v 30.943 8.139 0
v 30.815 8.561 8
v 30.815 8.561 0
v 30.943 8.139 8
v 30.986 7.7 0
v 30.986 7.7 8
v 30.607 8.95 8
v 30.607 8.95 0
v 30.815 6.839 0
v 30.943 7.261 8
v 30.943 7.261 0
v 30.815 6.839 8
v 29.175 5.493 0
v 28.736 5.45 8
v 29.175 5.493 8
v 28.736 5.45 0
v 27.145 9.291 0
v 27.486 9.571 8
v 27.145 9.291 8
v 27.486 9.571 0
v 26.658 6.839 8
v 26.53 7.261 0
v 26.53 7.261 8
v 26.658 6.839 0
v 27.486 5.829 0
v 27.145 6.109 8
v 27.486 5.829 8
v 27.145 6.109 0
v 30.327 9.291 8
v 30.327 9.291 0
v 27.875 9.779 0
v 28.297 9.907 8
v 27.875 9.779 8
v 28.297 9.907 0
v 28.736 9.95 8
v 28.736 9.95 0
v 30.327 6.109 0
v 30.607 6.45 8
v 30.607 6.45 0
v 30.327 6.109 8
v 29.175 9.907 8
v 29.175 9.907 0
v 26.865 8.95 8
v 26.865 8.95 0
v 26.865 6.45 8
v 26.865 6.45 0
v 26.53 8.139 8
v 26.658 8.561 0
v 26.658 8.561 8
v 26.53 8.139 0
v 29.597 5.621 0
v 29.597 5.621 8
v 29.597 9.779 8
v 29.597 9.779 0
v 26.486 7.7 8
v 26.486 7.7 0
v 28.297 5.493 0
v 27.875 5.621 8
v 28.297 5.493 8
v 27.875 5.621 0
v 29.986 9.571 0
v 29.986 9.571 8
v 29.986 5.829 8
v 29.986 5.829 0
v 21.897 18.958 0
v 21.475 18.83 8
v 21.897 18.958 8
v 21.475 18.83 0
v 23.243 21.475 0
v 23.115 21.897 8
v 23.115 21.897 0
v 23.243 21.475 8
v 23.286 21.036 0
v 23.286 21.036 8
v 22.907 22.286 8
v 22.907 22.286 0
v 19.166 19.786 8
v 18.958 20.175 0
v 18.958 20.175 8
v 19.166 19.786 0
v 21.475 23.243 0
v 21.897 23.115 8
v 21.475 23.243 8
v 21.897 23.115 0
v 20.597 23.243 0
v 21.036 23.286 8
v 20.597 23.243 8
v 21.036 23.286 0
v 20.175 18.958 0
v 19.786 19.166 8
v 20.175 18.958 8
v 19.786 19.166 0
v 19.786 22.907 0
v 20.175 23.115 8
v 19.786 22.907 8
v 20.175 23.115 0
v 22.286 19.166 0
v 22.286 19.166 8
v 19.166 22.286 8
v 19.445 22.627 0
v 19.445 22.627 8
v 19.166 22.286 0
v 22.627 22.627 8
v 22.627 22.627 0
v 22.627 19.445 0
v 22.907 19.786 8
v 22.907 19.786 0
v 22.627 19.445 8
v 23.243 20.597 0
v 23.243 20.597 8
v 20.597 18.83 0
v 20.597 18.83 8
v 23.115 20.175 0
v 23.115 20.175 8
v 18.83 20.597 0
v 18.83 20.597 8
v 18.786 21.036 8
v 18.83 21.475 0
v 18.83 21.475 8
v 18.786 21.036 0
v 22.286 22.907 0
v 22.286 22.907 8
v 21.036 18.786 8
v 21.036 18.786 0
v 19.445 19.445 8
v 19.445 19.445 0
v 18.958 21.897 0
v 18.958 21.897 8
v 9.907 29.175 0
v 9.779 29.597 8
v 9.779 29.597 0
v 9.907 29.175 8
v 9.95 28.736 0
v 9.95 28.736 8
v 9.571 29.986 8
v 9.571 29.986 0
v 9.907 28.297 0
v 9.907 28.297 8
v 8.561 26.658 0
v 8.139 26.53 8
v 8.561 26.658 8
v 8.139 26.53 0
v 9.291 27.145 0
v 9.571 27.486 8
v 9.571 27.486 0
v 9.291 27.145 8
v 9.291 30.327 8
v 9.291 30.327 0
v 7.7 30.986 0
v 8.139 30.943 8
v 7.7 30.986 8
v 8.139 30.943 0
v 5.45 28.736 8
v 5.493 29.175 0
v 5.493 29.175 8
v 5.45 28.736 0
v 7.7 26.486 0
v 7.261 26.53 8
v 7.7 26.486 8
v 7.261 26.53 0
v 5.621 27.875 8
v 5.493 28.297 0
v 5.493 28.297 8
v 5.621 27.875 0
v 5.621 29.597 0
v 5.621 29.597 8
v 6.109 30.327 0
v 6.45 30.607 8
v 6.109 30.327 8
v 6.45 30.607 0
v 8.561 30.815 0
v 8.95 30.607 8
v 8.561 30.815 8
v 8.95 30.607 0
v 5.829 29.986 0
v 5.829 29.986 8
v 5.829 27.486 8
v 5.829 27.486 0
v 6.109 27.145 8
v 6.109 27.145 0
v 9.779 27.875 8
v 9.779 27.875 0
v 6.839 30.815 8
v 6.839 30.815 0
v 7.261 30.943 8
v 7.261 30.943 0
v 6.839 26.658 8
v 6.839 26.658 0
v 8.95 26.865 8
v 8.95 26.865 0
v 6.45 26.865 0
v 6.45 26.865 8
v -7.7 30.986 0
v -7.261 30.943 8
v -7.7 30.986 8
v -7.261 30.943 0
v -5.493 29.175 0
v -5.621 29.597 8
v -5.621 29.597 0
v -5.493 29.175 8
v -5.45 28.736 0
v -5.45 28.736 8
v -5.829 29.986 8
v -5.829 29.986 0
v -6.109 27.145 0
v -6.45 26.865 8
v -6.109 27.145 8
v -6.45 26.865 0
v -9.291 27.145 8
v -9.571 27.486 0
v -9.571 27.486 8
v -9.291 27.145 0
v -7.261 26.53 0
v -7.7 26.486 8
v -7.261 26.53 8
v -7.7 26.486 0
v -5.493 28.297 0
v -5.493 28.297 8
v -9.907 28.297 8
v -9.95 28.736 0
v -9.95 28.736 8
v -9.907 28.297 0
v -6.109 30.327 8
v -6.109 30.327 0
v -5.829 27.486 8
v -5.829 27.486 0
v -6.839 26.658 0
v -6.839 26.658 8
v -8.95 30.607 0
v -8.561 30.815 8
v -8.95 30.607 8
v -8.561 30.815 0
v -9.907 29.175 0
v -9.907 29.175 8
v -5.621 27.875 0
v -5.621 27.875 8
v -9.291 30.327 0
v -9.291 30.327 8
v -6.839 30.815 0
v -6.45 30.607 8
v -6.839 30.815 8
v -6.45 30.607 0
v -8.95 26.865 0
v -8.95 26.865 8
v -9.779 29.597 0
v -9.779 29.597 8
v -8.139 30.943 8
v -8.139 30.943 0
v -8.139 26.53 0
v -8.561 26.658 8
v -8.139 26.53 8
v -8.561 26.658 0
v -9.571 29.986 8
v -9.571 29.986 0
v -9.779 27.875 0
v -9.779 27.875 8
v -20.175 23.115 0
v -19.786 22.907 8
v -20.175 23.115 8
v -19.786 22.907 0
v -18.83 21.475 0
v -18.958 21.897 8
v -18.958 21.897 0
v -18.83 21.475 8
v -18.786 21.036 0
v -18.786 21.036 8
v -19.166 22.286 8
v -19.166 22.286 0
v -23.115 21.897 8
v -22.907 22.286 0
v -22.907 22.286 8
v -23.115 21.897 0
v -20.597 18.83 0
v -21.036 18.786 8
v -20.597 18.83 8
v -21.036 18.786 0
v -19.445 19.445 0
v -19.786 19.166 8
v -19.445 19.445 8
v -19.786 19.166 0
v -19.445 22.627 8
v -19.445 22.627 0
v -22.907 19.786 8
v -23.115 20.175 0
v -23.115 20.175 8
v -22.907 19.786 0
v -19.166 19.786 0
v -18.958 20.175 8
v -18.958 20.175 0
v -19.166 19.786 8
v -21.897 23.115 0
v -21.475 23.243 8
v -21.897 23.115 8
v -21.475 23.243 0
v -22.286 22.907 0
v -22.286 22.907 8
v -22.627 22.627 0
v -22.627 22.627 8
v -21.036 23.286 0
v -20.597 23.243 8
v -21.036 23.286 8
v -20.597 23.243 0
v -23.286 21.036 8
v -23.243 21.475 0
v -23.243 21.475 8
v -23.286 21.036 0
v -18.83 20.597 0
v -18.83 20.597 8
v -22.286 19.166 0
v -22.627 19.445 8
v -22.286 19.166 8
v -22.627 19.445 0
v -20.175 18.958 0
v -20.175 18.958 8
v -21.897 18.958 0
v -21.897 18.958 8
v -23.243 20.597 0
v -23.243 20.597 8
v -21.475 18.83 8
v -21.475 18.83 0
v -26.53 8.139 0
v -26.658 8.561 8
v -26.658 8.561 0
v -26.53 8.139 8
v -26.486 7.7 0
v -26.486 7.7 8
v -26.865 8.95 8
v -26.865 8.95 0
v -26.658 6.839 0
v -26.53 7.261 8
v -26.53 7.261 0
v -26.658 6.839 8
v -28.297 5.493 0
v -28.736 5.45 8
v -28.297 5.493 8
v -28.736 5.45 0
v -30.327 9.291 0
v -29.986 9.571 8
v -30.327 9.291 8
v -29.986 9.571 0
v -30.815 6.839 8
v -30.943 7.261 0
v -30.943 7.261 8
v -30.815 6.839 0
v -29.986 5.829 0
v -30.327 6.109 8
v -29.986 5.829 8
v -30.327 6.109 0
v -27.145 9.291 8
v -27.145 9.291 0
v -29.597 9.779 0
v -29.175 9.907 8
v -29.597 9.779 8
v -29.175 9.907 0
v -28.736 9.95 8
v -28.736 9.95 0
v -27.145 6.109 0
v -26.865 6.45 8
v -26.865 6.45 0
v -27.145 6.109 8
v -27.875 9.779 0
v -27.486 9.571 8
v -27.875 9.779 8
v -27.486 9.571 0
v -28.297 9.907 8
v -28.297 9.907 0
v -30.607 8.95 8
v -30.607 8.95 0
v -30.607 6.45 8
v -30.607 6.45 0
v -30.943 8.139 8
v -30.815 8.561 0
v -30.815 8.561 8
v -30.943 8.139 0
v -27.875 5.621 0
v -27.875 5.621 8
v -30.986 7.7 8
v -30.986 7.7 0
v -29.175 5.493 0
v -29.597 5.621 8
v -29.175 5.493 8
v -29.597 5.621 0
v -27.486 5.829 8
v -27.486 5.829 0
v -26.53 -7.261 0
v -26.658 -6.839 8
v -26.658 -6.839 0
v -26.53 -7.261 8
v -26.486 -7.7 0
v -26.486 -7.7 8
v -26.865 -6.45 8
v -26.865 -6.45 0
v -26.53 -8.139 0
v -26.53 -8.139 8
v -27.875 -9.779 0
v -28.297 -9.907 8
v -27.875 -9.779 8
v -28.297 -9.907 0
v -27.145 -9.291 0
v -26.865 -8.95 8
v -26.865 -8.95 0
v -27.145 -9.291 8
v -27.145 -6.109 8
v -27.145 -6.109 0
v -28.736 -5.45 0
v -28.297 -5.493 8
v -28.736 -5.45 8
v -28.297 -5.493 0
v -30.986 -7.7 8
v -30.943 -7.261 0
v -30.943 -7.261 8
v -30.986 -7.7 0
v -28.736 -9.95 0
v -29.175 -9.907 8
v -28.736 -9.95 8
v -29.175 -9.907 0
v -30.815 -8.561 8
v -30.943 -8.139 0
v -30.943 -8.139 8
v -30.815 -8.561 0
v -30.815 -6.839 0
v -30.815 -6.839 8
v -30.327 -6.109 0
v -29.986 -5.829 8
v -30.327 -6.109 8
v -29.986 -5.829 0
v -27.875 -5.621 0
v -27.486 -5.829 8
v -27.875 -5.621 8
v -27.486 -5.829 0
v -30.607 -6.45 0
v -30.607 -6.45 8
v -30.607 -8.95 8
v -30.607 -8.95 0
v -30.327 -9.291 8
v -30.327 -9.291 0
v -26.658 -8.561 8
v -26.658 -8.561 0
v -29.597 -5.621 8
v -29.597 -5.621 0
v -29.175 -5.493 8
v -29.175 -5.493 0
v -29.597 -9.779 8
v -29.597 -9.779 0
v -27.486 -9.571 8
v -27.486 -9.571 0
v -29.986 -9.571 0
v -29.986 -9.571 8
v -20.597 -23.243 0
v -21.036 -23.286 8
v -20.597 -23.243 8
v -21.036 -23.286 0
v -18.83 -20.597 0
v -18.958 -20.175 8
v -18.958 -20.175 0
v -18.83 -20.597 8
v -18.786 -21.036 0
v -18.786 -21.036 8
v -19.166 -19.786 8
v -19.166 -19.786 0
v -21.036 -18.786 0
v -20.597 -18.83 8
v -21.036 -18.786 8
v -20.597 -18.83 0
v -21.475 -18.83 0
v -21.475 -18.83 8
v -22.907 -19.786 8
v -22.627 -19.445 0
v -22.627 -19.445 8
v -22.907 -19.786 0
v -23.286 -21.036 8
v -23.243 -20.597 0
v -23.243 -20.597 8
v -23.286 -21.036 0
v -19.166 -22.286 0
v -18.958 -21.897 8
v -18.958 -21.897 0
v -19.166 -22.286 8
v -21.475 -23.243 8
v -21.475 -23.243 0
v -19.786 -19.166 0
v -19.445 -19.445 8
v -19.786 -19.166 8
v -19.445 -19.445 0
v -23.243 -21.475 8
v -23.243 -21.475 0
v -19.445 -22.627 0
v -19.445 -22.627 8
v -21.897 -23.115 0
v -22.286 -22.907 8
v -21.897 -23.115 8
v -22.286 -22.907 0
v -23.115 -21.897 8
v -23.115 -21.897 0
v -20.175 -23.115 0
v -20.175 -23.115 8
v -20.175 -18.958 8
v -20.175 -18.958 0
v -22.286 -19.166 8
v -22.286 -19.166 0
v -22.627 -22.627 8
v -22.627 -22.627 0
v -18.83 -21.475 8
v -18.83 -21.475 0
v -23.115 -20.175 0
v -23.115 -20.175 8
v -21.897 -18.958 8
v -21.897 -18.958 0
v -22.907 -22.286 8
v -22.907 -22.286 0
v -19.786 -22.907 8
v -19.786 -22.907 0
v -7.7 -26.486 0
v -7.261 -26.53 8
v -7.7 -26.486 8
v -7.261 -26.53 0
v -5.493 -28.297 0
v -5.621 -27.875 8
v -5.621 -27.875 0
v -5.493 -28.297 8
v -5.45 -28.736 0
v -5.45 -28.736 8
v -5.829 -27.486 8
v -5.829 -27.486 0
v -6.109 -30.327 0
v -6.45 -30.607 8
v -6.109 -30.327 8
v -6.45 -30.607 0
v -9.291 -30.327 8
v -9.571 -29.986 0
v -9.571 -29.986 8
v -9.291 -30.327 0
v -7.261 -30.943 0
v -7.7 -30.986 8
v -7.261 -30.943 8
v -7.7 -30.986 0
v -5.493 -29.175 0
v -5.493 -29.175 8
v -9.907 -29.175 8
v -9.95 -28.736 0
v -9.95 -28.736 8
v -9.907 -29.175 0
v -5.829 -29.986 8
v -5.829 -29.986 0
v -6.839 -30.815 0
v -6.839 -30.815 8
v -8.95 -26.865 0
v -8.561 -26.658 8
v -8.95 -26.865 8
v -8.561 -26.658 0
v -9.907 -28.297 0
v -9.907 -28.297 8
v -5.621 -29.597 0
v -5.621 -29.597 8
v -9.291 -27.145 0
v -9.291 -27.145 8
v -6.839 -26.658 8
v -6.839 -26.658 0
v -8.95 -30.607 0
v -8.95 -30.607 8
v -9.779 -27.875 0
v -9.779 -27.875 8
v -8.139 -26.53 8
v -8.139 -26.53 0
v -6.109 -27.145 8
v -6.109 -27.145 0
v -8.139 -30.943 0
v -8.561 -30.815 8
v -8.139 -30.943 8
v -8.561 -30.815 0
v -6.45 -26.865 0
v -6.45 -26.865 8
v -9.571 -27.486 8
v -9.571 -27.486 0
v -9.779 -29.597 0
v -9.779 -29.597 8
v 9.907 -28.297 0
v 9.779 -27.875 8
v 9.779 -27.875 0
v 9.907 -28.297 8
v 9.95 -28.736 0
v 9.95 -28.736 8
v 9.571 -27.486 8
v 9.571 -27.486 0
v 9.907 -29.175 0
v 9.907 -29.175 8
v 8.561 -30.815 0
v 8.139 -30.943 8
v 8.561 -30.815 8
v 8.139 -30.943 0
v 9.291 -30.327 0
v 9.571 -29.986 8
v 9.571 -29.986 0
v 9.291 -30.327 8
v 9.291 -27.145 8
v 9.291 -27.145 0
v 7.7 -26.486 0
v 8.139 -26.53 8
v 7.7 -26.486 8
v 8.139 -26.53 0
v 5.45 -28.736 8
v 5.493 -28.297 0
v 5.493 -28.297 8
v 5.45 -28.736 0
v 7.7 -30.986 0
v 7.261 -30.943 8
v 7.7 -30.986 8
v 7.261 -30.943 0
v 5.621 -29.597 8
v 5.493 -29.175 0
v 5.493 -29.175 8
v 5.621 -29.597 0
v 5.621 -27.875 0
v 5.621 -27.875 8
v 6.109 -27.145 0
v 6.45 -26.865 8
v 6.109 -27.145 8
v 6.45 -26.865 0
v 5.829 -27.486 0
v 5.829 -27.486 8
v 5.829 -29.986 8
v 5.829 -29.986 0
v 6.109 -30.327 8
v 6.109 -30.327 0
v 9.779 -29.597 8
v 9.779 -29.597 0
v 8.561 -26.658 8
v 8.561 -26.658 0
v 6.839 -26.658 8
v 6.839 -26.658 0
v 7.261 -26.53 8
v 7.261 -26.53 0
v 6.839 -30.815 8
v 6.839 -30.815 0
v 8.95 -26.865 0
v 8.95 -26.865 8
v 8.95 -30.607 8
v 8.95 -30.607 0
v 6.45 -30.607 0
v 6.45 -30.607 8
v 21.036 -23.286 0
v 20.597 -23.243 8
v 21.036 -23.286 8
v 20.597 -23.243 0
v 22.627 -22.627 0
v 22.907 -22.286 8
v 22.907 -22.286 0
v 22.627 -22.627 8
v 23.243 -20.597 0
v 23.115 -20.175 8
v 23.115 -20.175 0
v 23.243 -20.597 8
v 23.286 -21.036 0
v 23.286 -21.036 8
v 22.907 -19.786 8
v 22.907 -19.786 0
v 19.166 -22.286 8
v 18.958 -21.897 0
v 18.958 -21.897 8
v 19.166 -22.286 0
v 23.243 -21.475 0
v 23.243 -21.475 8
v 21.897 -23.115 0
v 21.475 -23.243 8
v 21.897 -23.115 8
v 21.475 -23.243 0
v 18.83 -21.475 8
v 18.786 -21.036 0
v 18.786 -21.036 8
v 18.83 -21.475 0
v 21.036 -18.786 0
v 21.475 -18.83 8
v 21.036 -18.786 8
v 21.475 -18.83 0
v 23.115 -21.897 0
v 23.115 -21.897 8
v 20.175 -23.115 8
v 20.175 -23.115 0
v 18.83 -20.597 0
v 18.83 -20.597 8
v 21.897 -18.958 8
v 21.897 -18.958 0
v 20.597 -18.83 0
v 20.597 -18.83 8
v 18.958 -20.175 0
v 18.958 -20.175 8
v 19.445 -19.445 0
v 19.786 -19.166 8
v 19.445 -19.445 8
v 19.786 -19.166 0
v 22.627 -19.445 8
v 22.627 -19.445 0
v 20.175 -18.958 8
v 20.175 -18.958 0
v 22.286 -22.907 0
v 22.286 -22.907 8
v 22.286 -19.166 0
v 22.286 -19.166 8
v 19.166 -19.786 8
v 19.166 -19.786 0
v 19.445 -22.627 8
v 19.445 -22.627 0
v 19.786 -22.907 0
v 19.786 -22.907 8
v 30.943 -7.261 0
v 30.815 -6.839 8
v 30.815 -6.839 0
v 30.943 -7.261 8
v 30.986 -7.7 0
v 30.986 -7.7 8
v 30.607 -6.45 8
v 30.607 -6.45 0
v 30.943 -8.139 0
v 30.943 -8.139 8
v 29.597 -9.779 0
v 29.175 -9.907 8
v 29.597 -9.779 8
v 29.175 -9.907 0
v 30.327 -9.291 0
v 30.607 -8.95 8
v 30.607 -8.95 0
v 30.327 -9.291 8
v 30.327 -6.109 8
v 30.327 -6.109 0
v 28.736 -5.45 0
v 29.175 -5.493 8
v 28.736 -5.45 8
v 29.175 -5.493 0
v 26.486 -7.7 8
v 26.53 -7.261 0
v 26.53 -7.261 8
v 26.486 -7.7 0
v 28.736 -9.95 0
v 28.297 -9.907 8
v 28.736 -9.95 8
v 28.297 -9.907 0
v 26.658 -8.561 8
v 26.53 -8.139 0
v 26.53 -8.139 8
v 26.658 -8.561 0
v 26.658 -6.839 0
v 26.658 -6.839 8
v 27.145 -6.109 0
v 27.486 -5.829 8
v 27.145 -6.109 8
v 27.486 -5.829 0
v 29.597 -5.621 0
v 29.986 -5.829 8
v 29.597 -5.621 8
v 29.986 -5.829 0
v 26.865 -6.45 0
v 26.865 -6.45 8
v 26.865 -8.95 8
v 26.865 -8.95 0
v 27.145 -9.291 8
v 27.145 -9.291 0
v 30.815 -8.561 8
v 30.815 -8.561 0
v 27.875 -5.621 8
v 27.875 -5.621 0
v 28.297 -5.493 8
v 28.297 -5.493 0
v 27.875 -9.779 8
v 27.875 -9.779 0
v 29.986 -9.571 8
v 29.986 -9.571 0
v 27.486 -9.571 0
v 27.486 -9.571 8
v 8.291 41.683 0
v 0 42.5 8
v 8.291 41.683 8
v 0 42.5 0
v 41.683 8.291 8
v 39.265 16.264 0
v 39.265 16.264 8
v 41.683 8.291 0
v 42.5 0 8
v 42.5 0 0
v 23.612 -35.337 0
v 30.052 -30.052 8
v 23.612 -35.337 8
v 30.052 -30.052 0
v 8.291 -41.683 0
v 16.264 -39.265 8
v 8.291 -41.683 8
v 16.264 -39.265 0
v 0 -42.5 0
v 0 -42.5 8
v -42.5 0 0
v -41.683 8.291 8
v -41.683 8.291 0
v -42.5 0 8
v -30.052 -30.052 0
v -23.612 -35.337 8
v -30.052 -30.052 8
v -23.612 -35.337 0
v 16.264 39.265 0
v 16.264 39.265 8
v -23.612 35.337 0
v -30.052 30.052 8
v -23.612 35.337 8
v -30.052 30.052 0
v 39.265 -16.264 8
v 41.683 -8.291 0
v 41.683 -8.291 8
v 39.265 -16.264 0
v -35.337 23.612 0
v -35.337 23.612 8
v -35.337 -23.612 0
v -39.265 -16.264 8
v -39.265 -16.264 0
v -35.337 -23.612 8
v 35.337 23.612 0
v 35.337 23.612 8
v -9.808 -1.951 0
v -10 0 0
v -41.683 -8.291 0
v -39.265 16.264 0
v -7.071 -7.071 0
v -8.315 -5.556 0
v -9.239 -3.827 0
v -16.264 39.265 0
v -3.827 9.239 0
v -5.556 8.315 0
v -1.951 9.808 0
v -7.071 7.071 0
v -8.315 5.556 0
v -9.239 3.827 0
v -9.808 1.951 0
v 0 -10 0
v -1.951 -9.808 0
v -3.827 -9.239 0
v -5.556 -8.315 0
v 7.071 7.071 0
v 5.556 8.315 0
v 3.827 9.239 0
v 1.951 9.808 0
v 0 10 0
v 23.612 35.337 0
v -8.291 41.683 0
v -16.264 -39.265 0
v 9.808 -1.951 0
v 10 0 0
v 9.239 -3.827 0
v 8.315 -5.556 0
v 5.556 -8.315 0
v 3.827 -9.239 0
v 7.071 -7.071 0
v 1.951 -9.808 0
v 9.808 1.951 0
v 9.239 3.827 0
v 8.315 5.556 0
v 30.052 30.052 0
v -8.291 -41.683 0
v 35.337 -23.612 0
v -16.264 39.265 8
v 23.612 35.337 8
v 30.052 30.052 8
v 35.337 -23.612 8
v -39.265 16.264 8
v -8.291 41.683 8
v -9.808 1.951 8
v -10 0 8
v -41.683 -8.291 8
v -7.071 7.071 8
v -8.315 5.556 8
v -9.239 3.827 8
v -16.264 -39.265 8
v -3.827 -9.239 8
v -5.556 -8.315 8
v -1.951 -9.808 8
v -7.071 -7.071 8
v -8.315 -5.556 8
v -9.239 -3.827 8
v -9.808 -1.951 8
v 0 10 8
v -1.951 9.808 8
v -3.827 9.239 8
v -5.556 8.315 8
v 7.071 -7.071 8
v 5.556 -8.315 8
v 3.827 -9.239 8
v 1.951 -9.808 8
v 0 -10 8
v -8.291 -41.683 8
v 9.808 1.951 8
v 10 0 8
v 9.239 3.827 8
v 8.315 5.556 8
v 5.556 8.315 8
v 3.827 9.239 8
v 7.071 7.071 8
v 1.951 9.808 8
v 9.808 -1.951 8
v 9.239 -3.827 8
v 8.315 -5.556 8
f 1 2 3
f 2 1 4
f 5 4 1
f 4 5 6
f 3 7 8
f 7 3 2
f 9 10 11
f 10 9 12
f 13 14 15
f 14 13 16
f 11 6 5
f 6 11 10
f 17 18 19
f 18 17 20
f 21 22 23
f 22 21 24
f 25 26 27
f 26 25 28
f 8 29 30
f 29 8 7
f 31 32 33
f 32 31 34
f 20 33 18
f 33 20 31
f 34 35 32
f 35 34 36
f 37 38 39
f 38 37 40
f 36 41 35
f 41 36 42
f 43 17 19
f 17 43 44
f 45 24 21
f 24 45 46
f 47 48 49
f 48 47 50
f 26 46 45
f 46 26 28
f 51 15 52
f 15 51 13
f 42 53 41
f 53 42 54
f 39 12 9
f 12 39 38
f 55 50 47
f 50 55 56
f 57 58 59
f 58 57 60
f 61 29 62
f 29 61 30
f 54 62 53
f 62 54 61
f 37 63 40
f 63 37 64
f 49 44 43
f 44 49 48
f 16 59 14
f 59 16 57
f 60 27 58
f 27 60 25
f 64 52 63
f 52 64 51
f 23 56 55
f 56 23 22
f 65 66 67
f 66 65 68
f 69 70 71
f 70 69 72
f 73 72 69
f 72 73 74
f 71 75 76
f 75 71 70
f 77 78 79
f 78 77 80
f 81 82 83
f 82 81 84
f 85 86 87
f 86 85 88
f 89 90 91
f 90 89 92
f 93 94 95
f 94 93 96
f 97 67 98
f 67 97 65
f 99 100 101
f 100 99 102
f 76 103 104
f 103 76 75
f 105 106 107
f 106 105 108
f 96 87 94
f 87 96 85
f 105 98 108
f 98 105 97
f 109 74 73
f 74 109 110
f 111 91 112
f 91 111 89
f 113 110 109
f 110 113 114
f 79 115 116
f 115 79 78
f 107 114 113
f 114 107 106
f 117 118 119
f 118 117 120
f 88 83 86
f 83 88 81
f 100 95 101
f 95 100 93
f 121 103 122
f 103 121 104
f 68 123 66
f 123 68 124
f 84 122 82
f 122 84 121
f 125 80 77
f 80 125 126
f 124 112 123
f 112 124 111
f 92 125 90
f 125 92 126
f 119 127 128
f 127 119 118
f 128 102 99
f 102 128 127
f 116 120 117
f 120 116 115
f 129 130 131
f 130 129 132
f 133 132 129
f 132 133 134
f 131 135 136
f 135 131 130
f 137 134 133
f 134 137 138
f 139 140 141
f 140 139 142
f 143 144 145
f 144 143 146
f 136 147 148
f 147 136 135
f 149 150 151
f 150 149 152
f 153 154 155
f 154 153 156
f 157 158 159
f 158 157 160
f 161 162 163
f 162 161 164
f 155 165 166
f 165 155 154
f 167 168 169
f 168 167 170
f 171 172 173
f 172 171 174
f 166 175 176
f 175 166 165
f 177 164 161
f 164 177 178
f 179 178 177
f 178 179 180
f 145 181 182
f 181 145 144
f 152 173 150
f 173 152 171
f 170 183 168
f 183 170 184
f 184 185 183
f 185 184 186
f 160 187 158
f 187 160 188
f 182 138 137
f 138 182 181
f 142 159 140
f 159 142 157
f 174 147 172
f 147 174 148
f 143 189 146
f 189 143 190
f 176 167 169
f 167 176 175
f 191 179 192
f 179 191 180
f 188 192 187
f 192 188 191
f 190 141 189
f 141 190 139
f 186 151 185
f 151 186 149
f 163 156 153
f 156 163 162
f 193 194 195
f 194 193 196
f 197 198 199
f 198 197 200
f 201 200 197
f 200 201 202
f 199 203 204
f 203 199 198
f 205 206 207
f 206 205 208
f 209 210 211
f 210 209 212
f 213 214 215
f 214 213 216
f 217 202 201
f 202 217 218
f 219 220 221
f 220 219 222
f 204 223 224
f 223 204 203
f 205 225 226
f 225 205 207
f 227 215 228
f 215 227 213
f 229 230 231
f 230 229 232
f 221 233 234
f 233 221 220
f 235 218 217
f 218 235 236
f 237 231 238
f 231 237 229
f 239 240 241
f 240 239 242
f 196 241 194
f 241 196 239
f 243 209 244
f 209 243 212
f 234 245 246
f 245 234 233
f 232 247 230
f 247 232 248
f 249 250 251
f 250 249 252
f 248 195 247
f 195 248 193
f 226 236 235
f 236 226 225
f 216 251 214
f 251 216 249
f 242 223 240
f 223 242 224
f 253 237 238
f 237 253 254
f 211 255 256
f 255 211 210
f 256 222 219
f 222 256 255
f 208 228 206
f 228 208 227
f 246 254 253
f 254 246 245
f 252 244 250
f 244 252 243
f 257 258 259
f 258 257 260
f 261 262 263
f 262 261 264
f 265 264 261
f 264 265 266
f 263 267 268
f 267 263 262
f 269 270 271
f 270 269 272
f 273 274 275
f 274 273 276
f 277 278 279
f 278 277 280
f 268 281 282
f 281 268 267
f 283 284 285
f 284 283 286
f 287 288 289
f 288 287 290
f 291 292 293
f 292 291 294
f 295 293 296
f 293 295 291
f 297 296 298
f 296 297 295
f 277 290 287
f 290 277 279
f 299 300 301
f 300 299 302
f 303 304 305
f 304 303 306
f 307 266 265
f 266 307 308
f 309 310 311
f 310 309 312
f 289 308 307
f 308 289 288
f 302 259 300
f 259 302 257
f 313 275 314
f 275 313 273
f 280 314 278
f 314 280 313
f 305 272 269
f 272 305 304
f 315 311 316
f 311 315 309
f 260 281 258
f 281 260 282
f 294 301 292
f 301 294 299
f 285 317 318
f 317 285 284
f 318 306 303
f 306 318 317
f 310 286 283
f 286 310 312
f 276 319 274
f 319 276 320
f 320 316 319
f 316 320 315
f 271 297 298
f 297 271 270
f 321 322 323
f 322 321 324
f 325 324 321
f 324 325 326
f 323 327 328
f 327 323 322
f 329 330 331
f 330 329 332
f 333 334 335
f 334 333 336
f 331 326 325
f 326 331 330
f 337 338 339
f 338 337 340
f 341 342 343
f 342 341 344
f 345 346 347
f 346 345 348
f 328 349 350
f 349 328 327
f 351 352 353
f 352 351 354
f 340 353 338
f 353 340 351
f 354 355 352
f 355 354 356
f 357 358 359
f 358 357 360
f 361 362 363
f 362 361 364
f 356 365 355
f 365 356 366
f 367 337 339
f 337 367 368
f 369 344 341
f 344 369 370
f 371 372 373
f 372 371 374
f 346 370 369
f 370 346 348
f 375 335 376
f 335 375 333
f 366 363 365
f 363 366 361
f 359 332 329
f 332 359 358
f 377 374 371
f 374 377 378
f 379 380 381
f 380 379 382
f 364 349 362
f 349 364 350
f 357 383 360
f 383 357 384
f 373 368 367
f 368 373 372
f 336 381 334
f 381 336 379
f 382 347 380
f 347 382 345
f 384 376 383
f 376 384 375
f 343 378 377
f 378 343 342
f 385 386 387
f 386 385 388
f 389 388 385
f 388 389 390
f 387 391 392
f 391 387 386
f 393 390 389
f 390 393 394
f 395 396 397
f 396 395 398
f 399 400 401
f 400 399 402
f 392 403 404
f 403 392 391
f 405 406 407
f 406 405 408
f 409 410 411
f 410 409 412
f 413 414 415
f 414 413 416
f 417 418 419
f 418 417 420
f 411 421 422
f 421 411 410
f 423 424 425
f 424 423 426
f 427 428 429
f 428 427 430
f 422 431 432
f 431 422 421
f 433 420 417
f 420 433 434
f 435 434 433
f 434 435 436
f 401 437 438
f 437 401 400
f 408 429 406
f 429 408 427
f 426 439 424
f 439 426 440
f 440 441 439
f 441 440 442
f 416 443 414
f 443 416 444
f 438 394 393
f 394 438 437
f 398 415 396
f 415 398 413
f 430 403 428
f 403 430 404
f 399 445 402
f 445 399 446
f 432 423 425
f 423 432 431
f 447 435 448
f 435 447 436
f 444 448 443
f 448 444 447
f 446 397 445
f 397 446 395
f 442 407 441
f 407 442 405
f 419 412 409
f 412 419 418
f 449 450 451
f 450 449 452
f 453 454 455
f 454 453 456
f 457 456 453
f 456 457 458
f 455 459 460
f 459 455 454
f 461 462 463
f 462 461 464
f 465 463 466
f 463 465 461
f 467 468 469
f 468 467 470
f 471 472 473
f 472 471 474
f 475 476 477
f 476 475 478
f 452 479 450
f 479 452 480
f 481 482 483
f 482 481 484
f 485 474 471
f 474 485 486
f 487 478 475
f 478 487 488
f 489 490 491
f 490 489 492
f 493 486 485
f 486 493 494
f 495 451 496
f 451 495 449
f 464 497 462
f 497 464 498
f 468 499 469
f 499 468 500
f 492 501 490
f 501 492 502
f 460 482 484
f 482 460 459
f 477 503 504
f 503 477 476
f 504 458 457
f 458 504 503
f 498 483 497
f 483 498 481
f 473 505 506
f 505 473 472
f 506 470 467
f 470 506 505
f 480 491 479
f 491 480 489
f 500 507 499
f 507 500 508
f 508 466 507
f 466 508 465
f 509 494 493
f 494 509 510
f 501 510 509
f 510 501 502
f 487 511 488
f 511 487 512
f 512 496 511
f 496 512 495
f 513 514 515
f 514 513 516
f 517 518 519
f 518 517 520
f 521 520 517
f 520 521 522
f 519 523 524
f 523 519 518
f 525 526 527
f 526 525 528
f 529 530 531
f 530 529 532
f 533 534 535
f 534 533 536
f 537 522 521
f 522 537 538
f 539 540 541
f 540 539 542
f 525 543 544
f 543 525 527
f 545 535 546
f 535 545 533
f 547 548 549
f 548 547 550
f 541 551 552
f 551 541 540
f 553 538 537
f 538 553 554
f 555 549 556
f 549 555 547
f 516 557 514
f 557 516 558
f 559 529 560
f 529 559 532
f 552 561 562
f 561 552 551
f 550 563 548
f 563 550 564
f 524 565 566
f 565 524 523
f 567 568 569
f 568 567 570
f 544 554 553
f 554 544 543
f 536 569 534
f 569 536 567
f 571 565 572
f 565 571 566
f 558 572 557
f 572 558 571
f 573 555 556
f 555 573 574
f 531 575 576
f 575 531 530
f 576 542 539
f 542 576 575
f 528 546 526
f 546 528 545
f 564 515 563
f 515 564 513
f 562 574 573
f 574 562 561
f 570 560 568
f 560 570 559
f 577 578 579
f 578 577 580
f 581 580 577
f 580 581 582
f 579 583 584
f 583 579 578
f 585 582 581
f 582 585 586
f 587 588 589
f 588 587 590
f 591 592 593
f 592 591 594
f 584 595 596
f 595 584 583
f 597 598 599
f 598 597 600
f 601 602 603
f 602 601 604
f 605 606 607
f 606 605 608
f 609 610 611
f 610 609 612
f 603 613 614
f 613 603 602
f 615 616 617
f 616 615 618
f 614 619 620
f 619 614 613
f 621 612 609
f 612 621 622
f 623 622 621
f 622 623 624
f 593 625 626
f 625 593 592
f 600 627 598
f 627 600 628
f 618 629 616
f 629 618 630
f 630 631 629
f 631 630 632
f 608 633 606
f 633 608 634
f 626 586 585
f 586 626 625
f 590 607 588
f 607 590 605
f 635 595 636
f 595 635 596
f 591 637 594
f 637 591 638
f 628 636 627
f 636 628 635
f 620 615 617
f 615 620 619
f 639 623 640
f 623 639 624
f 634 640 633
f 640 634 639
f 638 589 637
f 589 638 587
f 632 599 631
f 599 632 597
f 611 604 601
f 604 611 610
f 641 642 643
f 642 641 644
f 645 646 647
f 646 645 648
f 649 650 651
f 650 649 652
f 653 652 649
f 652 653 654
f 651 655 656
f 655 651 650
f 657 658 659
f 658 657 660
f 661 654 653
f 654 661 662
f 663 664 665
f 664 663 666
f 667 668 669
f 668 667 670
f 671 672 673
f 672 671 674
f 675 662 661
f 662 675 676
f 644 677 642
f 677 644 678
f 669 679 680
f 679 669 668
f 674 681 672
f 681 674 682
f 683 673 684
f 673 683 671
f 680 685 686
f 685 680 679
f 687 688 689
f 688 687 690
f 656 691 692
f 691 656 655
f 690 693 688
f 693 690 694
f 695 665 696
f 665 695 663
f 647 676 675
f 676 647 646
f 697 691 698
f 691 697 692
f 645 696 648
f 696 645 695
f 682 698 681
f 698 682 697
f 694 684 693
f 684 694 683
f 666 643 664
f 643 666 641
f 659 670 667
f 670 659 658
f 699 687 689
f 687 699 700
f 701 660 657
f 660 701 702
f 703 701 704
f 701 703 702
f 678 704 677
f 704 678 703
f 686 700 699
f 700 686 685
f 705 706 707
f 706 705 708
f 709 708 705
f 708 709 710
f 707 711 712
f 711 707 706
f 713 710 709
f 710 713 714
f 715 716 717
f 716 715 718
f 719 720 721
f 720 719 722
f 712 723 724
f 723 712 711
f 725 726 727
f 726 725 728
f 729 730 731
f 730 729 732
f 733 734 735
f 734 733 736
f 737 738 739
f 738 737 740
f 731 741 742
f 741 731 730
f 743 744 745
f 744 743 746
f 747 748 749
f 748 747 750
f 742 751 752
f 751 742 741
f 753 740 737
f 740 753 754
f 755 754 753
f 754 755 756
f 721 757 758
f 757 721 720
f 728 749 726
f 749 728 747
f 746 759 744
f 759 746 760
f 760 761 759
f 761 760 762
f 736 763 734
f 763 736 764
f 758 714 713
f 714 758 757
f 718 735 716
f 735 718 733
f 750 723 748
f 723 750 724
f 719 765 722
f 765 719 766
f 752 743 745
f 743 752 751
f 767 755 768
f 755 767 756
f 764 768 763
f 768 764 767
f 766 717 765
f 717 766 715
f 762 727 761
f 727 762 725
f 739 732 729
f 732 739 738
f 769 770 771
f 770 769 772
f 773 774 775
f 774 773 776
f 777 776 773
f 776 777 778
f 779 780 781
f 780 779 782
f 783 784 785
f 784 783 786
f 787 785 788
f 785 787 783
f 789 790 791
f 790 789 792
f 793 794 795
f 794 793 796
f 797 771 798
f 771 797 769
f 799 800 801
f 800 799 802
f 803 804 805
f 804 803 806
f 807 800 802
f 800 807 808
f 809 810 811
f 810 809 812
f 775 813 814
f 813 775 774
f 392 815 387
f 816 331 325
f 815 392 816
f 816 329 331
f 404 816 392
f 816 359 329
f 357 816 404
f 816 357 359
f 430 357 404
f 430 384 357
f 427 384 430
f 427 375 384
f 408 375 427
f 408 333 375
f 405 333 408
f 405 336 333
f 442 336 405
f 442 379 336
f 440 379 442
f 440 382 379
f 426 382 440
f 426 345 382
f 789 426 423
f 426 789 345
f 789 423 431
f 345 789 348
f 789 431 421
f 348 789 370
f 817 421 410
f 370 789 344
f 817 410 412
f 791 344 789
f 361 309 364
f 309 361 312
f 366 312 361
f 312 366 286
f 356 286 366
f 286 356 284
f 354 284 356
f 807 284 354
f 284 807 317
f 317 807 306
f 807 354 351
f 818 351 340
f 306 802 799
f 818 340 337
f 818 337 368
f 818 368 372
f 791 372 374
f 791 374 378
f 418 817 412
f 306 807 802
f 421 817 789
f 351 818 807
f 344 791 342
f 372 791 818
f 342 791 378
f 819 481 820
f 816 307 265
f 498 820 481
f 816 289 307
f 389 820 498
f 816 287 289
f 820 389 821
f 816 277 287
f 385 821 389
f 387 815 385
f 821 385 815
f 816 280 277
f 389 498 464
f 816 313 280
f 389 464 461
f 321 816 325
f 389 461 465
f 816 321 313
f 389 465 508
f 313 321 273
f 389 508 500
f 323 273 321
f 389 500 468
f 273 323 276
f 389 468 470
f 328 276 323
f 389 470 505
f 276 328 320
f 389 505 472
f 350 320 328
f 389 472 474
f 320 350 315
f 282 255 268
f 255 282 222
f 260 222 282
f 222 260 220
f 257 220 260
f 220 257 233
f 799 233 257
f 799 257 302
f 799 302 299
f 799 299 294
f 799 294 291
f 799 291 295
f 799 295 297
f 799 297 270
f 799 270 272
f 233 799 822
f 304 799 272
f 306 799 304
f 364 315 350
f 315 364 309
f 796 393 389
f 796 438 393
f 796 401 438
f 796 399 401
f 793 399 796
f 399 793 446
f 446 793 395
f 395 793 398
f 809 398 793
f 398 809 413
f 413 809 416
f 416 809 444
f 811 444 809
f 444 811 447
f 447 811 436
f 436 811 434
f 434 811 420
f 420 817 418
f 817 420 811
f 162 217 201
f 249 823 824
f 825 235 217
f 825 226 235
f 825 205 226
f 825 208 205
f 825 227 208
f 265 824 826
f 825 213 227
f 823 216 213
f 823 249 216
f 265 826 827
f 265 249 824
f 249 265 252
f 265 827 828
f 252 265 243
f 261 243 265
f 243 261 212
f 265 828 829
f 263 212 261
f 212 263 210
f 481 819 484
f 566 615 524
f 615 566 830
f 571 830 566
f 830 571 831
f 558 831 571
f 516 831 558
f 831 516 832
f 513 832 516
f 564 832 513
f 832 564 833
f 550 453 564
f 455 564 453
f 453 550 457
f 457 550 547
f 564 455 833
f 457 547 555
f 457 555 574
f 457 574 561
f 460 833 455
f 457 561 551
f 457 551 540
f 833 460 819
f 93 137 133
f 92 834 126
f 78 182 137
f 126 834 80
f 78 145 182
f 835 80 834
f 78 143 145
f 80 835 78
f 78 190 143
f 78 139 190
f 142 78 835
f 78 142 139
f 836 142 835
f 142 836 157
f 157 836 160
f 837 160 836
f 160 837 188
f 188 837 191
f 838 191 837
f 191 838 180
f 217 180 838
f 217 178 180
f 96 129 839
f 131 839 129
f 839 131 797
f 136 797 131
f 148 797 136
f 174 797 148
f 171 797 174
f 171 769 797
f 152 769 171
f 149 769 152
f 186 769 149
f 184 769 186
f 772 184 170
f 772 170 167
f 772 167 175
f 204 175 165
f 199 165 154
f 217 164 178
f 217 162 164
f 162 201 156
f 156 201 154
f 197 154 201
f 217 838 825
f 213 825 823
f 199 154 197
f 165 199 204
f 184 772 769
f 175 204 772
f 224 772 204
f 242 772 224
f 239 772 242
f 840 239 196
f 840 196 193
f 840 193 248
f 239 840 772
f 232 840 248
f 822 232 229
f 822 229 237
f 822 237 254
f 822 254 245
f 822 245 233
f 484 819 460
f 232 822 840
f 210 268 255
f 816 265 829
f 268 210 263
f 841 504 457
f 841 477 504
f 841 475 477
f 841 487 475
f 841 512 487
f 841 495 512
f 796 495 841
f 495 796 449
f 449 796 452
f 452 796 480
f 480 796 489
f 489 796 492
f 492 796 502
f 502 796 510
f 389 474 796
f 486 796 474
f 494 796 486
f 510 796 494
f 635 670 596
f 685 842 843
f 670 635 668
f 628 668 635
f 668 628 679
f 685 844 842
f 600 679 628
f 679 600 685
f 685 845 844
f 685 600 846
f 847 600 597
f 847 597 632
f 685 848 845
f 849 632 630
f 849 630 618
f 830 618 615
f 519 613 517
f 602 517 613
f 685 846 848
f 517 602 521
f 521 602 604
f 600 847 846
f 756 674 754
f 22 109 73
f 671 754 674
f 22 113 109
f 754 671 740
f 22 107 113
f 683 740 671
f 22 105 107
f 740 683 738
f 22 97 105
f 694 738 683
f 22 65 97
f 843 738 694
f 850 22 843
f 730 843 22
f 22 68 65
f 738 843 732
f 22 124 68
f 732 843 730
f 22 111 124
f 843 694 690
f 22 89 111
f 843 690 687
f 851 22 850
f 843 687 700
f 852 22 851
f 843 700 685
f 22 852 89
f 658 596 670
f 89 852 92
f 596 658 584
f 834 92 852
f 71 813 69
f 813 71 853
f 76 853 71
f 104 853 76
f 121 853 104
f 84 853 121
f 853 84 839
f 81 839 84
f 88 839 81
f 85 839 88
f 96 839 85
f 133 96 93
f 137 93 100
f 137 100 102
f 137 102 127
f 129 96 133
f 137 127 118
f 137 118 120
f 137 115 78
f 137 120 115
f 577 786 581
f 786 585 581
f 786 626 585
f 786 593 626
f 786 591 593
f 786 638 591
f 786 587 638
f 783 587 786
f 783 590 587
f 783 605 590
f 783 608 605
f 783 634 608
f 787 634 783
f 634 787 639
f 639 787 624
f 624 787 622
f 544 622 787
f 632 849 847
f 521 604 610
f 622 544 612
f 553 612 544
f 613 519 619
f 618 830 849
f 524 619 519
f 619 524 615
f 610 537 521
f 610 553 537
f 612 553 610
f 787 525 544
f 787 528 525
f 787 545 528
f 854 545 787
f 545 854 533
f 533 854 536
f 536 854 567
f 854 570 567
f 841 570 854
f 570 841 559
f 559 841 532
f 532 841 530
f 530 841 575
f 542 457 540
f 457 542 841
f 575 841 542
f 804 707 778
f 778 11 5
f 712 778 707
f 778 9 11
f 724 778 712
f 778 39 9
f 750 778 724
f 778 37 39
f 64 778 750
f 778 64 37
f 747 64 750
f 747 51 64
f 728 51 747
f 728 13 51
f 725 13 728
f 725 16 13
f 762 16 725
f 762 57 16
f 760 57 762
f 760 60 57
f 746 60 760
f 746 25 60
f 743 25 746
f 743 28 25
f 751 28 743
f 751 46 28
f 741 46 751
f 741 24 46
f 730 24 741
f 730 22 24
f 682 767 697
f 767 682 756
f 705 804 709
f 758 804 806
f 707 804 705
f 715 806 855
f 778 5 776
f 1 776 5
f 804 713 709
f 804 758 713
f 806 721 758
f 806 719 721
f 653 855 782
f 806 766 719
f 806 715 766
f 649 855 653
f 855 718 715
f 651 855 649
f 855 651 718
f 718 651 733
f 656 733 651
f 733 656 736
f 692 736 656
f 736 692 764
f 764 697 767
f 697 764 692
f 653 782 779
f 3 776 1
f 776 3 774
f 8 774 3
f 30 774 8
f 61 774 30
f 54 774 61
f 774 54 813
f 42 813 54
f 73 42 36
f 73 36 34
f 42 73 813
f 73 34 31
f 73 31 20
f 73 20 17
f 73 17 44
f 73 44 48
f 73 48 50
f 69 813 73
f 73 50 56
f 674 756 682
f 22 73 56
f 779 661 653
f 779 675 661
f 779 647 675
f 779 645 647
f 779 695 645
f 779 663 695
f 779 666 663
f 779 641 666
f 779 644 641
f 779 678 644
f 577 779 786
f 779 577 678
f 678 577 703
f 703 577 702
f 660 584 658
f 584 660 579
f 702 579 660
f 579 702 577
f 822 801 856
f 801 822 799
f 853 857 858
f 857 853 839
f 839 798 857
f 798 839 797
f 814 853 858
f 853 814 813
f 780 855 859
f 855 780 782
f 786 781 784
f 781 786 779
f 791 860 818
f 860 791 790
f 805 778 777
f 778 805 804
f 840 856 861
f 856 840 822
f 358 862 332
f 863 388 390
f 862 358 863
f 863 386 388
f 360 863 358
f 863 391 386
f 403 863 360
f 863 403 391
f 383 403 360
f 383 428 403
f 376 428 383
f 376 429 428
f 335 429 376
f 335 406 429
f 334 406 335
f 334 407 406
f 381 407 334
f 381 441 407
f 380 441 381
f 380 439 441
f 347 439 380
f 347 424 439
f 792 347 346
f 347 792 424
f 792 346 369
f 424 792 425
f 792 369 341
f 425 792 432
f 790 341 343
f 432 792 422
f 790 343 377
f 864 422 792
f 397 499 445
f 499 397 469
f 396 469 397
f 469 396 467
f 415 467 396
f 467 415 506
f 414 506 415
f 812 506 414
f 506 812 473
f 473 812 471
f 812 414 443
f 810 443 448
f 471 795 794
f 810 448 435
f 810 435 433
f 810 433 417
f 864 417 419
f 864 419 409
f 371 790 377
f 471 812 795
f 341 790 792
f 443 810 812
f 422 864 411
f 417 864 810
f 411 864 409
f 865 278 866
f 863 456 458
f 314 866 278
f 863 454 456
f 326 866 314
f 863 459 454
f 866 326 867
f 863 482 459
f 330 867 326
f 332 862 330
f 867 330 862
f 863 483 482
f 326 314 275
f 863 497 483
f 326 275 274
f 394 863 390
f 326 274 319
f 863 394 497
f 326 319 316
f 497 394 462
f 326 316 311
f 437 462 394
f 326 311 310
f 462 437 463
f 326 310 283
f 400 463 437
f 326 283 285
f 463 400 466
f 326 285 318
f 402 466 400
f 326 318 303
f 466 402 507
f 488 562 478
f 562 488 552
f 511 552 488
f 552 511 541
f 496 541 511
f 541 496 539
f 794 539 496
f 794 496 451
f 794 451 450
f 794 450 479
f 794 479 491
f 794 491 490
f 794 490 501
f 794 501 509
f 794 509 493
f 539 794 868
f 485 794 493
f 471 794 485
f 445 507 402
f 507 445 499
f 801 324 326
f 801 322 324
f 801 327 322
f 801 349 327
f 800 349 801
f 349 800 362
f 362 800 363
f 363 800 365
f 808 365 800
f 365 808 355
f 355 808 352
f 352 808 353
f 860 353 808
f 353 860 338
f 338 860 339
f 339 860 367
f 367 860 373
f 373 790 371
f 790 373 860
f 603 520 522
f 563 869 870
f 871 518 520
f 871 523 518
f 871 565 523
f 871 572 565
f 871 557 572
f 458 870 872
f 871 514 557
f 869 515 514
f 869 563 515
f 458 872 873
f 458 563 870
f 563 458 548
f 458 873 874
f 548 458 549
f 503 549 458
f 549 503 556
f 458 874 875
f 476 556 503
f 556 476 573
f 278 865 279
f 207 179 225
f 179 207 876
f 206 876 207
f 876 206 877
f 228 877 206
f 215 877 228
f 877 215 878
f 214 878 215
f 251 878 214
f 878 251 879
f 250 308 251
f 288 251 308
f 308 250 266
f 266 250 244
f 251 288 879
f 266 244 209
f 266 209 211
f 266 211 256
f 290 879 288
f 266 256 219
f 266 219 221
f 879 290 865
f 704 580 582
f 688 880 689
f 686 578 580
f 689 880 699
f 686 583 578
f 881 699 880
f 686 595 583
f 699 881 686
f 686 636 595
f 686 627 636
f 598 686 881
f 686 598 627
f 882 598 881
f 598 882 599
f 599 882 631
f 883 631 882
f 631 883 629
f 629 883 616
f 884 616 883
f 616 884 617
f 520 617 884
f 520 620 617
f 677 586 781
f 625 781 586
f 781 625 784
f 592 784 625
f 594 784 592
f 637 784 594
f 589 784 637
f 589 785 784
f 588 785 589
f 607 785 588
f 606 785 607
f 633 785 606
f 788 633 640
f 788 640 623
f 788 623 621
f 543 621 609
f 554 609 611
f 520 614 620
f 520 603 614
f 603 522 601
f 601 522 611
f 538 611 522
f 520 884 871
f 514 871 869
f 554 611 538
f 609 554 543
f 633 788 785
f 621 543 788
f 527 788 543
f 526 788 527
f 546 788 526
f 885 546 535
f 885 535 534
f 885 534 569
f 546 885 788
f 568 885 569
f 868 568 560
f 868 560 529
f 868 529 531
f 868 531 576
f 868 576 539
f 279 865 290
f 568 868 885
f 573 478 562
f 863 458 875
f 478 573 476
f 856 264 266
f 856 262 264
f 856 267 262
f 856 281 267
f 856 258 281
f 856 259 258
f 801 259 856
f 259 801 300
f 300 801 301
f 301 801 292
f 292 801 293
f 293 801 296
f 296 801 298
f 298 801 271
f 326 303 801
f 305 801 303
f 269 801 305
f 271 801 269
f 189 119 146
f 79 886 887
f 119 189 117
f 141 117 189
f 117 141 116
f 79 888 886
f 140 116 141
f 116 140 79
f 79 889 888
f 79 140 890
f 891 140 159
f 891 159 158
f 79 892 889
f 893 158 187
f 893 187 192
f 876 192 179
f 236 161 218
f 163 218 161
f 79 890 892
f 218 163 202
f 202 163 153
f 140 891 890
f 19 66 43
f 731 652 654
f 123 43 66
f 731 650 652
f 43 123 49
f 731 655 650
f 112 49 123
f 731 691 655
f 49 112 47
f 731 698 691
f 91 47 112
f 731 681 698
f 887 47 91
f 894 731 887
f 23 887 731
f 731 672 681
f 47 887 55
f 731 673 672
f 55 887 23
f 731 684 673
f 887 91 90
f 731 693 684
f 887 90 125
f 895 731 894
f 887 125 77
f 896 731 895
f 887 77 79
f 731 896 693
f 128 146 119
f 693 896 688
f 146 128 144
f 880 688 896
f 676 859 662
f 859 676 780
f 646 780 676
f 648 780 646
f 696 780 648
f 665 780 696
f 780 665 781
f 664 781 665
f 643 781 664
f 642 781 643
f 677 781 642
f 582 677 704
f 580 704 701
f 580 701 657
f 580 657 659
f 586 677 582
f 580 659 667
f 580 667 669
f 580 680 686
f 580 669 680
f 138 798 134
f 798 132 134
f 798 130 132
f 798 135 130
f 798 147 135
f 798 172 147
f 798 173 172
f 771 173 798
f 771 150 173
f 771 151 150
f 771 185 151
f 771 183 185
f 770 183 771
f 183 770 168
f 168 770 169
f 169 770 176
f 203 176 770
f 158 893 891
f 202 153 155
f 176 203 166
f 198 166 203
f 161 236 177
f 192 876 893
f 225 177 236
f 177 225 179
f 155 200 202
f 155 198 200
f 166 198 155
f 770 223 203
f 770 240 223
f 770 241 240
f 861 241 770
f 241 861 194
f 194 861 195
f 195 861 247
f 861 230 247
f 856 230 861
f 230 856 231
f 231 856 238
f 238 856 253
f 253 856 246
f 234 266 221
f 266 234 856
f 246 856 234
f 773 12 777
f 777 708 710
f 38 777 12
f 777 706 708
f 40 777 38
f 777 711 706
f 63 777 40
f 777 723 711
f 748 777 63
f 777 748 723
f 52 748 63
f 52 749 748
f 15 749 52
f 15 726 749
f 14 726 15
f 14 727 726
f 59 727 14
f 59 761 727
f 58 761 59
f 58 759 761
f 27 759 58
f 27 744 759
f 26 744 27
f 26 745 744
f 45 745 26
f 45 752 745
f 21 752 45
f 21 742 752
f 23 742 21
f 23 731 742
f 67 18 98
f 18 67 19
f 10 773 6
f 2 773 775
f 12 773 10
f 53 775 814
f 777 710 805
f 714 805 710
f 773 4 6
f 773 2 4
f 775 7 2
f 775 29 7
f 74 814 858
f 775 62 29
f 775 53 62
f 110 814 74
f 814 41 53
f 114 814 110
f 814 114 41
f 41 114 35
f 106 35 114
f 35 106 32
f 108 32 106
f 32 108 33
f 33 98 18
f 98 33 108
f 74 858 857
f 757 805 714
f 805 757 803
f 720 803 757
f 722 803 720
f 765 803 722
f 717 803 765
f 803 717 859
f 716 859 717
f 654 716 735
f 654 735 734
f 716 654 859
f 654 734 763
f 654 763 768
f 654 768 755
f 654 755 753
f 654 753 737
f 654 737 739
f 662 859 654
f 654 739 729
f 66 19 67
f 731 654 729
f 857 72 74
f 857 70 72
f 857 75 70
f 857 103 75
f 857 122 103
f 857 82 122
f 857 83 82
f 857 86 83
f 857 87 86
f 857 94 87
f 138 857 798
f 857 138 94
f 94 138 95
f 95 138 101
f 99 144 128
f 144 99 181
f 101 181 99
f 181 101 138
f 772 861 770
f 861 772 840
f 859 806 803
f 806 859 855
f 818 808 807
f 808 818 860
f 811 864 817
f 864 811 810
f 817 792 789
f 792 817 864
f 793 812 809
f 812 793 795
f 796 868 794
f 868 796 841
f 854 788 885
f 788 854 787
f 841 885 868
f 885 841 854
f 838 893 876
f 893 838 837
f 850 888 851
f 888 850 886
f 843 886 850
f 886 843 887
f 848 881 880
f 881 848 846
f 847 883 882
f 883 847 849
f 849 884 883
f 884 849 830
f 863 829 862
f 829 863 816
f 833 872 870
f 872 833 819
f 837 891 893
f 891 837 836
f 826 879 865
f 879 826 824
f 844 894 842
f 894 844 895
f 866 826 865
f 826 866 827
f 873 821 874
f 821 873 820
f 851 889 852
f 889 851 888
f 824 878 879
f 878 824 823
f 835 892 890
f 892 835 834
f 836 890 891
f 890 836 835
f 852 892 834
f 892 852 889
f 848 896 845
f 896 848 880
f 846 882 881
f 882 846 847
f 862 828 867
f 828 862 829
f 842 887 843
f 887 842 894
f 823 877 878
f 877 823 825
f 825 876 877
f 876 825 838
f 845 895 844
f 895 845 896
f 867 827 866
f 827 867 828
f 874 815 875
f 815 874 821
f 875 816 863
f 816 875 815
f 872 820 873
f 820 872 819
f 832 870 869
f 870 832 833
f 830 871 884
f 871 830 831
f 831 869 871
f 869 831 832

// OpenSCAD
$fn = 32;

// ----------------------------------------------------------------------
// Flange Ø85 x 8
// 12 holes on a Ø59.5 bolt circle, bolted joints
// ----------------------------------------------------------------------

// --- parameters (mm) ---
flange_d = 85;   // outside diameter of the flange
thickness = 8;   // flange thickness
holes = 12;      // number of bolt holes
pcd = 59.5;      // bolt circle diameter
start_deg = 15;  // angle of the first hole, from +X
hole_d = 4.5;    // bolt hole diameter
bore_d = 20;     // central through bore
hub_d = 28;      // hub outside diameter
hub_h = 0;       // hub height above the flange face (0 = no hub)

// --- derived feature positions (mm) ---
height = thickness + hub_h;  // = 8   overall height of the part
pcd_r = pcd / 2;             // = 29.75   bolt circle radius
hole_step = 360 / holes;     // = 30   angular pitch
feature_centers = [
  [pcd_r * cos(start_deg + 0 * hole_step), pcd_r * sin(start_deg + 0 * hole_step)],
  [pcd_r * cos(start_deg + 1 * hole_step), pcd_r * sin(start_deg + 1 * hole_step)],
  [pcd_r * cos(start_deg + 2 * hole_step), pcd_r * sin(start_deg + 2 * hole_step)],
  [pcd_r * cos(start_deg + 3 * hole_step), pcd_r * sin(start_deg + 3 * hole_step)],
  [pcd_r * cos(start_deg + 4 * hole_step), pcd_r * sin(start_deg + 4 * hole_step)],
  [pcd_r * cos(start_deg + 5 * hole_step), pcd_r * sin(start_deg + 5 * hole_step)],
  [pcd_r * cos(start_deg + 6 * hole_step), pcd_r * sin(start_deg + 6 * hole_step)],
  [pcd_r * cos(start_deg + 7 * hole_step), pcd_r * sin(start_deg + 7 * hole_step)],
  [pcd_r * cos(start_deg + 8 * hole_step), pcd_r * sin(start_deg + 8 * hole_step)],
  [pcd_r * cos(start_deg + 9 * hole_step), pcd_r * sin(start_deg + 9 * hole_step)],
  [pcd_r * cos(start_deg + 10 * hole_step), pcd_r * sin(start_deg + 10 * hole_step)],
  [pcd_r * cos(start_deg + 11 * hole_step), pcd_r * sin(start_deg + 11 * hole_step)]
];   // bolt hole centres on the pitch circle

// flange disc, every hole and the bore cut straight through
difference() {
  union() {
    cylinder(d = flange_d, h = thickness);
  }
  translate([0, 0, -1]) cylinder(d = bore_d, h = height + 2);  // bore, through
  for (centre = feature_centers)
    translate([centre[0], centre[1], -1]) cylinder(d = hole_d, h = thickness + 2);
}
